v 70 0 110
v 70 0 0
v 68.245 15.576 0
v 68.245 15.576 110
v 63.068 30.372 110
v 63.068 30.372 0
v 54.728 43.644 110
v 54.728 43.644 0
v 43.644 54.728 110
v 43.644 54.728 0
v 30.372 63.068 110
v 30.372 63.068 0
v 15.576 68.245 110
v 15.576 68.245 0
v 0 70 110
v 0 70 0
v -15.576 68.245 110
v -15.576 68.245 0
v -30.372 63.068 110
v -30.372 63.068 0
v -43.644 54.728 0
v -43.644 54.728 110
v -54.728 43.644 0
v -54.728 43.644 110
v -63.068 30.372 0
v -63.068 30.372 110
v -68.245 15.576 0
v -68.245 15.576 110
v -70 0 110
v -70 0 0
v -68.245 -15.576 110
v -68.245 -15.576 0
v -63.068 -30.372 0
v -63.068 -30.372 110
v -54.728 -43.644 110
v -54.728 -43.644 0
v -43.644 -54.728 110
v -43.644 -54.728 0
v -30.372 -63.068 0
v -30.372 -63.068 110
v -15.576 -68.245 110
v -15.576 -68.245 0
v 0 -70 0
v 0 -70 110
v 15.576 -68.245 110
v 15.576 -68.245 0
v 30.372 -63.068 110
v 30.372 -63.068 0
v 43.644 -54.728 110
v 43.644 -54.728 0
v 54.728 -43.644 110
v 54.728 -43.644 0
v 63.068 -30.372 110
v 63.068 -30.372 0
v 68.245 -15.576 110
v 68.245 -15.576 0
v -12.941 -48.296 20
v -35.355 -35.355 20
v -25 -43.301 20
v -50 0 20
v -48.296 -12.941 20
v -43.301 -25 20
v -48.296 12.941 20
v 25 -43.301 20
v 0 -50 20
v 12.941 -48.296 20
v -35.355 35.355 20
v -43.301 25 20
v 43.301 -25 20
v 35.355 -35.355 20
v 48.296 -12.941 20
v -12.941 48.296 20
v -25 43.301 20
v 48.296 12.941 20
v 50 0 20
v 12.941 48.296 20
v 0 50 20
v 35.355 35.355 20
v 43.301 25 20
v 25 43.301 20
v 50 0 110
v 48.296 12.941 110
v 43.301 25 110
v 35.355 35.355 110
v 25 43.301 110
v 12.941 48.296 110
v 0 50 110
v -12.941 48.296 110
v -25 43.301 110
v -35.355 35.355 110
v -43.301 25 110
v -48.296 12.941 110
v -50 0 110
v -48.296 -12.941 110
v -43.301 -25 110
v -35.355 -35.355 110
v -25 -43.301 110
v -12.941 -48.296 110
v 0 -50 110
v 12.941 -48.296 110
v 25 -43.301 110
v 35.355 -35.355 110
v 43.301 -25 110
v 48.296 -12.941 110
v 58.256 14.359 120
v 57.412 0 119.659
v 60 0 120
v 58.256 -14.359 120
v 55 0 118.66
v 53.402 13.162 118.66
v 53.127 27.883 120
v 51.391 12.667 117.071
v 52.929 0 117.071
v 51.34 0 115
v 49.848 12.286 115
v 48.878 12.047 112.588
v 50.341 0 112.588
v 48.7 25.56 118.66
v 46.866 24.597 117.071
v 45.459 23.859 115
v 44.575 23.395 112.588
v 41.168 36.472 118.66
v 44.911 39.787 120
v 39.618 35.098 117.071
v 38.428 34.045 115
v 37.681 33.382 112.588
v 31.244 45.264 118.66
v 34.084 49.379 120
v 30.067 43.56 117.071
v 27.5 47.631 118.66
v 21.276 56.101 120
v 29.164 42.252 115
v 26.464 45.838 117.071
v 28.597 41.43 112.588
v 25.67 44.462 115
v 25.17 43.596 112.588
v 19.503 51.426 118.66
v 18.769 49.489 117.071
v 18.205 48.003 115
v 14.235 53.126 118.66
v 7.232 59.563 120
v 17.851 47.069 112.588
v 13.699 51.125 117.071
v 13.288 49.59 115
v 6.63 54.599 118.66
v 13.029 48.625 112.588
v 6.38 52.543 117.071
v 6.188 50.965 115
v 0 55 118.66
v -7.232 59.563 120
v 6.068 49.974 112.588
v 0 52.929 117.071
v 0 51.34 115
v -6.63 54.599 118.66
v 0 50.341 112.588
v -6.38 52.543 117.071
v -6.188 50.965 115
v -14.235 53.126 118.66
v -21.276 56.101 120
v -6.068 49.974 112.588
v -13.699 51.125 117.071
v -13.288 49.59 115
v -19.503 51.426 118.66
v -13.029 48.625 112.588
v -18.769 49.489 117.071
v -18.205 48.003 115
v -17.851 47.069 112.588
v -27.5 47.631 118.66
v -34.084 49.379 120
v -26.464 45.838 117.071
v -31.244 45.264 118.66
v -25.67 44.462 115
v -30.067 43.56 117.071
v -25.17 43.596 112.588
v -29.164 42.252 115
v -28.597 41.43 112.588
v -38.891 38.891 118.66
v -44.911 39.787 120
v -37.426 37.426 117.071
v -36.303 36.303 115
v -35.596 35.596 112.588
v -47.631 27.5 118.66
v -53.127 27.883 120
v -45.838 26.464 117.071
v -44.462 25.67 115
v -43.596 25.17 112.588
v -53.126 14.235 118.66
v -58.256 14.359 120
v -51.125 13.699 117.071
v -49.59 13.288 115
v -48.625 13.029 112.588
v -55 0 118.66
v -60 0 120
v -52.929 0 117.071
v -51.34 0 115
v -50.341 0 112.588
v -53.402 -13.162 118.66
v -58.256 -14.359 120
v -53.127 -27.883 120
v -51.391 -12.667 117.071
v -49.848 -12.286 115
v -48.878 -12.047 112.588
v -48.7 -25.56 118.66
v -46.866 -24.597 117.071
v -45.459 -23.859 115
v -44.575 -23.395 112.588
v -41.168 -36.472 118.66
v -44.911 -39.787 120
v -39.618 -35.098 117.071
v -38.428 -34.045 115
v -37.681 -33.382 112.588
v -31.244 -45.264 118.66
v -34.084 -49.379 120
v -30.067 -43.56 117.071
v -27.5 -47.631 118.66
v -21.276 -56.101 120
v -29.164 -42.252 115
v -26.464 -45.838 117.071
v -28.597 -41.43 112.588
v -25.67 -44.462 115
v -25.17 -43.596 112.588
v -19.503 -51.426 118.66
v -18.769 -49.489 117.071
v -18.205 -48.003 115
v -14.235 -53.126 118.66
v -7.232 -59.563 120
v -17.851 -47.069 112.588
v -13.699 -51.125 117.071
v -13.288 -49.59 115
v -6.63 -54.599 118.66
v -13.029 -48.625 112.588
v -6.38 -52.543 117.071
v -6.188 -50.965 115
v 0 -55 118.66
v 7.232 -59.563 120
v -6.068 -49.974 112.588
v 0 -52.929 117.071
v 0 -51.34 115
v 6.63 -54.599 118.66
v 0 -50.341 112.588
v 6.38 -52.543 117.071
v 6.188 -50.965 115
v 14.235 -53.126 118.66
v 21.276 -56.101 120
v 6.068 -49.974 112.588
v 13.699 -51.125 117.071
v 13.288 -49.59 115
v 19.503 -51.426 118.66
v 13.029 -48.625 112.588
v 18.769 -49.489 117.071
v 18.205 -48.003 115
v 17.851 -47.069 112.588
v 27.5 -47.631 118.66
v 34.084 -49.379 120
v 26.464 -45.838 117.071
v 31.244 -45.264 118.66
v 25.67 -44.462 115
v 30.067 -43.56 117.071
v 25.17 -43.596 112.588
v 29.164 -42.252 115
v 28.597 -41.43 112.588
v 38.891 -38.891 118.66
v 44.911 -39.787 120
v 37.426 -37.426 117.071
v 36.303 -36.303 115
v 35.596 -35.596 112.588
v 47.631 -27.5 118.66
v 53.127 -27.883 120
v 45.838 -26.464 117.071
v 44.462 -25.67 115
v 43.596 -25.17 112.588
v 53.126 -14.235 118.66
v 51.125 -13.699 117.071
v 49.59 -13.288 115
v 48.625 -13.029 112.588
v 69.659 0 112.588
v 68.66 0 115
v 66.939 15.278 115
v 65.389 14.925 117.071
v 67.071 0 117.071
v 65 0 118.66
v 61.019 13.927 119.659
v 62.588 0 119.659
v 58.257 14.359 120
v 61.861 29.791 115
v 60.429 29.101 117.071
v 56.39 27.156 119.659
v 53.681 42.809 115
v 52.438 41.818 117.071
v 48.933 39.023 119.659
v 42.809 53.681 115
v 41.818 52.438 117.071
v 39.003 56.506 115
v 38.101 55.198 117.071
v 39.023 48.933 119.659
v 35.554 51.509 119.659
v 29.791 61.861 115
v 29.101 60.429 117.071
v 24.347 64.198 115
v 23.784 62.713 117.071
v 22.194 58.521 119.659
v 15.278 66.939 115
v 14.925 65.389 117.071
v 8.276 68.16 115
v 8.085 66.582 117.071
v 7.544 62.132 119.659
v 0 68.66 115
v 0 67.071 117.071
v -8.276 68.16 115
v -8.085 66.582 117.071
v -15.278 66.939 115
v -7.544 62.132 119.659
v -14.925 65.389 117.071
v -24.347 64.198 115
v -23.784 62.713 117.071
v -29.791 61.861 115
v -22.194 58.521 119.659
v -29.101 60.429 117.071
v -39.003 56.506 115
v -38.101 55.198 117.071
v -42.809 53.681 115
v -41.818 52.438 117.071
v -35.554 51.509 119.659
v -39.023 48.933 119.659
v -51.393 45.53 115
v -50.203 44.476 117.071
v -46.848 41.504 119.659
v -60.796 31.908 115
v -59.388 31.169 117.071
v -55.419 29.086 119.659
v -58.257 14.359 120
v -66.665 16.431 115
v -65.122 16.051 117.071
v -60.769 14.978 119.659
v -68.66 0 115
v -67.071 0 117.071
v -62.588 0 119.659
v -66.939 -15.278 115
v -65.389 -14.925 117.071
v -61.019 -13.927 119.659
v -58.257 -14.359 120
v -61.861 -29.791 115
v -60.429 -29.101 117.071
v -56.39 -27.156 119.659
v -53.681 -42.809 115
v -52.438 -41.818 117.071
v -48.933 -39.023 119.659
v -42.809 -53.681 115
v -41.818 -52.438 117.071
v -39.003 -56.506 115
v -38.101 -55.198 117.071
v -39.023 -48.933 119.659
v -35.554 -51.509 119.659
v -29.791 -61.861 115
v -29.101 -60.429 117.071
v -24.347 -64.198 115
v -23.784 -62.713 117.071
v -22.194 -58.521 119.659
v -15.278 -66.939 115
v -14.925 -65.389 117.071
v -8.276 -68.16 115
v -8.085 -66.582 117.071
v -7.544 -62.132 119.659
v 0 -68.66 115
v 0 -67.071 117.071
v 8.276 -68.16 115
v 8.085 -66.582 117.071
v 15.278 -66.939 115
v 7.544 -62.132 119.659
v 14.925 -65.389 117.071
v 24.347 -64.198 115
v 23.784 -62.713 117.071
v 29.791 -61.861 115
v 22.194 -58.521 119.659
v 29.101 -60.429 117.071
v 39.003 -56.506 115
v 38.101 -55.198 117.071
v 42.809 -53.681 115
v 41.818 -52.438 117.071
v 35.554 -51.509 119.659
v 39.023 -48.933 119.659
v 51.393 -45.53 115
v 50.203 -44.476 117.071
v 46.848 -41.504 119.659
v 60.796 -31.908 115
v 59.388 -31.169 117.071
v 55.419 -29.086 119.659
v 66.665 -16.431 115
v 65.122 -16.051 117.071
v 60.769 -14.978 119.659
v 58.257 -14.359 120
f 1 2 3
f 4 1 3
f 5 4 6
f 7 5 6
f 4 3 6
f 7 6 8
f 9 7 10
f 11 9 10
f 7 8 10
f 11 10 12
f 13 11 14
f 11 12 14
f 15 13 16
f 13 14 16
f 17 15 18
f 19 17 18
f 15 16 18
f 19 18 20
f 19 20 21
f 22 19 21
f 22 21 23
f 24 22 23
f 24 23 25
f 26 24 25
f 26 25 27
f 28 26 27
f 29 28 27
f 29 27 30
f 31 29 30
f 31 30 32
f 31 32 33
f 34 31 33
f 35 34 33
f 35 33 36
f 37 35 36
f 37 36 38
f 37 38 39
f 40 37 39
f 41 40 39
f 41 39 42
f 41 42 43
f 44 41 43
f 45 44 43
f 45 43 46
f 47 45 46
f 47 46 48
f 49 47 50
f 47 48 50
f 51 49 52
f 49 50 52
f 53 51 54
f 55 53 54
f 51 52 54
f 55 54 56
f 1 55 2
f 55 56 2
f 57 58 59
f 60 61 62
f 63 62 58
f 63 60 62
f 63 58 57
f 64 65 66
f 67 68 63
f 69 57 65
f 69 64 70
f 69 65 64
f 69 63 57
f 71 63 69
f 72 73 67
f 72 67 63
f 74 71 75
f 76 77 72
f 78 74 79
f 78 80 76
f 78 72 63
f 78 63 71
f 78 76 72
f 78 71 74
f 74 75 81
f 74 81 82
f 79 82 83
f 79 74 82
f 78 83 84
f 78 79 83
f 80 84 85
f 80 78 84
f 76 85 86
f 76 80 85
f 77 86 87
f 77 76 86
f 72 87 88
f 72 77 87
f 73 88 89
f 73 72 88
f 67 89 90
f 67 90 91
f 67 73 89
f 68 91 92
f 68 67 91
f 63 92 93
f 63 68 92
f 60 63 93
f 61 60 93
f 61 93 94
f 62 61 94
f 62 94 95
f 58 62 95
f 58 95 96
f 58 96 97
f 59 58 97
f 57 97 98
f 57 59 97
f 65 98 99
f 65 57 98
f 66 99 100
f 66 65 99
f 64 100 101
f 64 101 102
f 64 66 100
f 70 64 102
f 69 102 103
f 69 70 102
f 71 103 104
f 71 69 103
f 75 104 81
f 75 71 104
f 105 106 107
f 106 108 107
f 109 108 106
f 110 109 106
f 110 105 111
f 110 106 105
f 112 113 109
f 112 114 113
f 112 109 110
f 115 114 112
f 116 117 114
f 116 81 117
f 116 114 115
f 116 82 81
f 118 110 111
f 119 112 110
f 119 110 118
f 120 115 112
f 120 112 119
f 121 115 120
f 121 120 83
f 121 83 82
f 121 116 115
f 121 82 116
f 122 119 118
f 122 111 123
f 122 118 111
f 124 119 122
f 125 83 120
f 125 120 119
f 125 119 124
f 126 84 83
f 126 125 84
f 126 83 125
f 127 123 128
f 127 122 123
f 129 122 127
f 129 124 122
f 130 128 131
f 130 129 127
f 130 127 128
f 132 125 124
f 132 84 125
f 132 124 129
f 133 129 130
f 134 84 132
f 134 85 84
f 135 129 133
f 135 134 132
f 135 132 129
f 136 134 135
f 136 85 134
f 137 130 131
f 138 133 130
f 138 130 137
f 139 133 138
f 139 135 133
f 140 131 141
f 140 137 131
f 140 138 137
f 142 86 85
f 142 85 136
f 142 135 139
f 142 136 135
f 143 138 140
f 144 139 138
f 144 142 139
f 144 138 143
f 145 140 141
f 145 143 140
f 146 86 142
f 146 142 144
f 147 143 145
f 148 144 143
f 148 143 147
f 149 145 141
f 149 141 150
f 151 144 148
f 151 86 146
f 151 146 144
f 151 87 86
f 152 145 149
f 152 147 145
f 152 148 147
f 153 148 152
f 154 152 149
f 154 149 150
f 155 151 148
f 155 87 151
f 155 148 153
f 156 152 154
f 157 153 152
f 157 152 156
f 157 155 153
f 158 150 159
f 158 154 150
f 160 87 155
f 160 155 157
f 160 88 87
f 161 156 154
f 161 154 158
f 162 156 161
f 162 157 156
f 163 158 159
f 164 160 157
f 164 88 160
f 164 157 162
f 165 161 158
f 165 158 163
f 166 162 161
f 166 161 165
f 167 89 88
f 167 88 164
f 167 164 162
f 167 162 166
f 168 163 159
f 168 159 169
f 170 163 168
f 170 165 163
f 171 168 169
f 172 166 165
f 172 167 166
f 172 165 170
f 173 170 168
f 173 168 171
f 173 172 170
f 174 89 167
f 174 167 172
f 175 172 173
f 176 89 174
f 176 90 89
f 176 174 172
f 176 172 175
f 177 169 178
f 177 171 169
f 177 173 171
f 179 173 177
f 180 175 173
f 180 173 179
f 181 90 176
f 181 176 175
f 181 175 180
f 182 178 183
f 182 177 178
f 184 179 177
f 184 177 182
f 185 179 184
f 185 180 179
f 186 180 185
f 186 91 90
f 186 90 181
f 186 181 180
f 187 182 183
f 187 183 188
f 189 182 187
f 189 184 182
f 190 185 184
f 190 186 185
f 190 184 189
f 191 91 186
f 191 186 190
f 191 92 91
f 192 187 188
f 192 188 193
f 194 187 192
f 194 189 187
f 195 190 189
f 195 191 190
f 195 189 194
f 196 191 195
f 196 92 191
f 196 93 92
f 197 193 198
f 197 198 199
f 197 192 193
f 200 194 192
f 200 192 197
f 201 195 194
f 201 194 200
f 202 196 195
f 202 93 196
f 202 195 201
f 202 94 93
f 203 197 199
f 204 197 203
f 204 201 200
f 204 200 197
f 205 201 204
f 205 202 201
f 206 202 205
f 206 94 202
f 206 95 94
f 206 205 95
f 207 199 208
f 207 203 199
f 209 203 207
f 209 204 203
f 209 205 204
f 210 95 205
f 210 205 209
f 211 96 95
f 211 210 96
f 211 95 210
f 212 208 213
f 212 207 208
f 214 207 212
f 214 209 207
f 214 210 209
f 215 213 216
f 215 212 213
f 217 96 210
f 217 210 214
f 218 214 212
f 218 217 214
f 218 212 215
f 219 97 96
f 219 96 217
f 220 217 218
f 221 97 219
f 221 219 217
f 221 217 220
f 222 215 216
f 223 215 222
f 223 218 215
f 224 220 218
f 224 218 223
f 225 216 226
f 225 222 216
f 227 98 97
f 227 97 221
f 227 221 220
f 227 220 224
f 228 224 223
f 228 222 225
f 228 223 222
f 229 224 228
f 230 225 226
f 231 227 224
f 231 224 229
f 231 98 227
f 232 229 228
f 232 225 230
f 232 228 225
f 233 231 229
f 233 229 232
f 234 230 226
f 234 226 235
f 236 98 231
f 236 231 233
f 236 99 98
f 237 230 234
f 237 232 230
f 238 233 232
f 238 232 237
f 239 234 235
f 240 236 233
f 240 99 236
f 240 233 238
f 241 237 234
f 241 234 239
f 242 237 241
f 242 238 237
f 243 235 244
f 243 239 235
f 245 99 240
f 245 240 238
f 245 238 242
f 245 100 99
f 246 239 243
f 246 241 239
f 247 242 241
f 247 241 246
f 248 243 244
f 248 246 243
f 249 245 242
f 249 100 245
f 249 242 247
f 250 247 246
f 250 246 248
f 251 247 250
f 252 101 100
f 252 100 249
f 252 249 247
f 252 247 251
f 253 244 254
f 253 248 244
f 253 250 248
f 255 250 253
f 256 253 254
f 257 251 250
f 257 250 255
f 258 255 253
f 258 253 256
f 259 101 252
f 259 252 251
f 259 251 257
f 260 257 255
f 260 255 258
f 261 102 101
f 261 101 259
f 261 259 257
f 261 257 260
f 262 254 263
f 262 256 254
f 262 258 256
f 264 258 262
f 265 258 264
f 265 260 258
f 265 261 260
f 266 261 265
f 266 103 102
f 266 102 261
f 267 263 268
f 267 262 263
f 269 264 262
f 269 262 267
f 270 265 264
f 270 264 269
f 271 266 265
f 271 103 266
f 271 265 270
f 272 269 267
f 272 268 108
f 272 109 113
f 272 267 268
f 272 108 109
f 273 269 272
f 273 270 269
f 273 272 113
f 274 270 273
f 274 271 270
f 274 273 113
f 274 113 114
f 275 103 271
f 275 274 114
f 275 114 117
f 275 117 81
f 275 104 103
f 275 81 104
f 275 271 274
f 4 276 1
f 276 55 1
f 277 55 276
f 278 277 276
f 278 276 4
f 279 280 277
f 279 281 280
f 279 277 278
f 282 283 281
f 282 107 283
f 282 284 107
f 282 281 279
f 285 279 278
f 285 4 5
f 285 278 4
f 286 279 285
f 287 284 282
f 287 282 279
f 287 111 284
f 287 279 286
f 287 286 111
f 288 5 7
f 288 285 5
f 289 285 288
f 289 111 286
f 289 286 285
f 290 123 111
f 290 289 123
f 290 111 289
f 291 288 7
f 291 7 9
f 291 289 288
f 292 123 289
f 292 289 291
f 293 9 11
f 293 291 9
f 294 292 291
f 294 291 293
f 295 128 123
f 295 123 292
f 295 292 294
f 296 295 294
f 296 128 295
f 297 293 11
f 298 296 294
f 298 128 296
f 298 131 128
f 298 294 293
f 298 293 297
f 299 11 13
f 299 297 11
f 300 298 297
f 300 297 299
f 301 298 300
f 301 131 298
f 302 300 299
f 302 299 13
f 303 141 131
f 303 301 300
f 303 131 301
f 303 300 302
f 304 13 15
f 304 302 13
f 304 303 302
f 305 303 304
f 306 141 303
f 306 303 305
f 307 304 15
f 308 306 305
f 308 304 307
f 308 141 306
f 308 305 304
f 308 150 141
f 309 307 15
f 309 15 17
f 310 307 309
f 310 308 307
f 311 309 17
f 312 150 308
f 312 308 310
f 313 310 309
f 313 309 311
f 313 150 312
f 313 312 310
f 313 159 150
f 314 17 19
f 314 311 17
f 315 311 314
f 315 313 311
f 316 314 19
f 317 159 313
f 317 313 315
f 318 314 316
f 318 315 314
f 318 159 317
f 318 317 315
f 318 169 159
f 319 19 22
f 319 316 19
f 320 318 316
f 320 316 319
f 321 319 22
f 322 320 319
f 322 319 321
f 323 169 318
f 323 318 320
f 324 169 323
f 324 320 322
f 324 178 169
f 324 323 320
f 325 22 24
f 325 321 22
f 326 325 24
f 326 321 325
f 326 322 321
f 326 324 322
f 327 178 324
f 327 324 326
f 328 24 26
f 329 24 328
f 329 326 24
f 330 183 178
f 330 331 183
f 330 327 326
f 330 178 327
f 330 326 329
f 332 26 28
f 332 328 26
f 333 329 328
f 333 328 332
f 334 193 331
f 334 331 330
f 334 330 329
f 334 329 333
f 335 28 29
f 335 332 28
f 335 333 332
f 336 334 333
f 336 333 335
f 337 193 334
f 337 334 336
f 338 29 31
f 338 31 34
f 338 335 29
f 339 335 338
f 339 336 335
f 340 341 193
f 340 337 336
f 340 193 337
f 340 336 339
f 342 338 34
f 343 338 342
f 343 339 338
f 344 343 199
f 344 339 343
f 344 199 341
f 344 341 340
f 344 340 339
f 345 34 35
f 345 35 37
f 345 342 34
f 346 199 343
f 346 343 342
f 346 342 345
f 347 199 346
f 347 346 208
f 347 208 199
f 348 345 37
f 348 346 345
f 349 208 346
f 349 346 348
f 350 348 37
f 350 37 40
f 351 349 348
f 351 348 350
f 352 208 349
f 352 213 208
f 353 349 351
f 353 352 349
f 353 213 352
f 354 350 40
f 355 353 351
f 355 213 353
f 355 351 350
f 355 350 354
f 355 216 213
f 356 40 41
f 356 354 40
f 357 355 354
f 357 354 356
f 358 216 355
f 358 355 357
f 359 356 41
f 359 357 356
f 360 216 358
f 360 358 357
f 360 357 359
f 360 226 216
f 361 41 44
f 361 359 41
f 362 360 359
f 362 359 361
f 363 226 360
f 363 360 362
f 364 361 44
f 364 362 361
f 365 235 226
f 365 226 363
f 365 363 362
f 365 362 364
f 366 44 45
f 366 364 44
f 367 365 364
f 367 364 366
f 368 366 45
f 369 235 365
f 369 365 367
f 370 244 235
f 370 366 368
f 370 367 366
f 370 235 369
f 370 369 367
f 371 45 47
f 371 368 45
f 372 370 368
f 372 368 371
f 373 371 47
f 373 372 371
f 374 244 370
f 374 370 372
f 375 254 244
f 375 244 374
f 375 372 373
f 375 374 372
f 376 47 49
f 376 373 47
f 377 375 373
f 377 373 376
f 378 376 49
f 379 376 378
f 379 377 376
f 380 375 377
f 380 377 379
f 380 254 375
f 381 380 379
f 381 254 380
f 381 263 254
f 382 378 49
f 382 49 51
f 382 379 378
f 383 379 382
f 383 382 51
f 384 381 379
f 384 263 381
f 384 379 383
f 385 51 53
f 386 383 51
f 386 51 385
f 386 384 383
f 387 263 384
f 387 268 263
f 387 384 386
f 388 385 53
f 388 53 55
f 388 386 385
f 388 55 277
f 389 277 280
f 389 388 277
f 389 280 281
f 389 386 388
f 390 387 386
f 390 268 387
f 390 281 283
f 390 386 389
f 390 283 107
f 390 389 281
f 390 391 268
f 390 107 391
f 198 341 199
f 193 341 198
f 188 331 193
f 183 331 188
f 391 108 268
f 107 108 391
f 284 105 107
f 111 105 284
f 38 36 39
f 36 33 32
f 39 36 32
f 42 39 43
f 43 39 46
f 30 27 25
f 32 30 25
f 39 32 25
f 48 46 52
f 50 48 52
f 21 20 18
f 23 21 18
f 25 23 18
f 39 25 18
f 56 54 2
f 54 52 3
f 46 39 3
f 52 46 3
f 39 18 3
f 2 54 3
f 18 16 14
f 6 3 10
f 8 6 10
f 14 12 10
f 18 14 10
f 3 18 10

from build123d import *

# Parameters (mm, degrees)
F2_R     = 70
F3_DEPTH = 20
F4_R     = 70
F4_R_2   = 50
F5_DEPTH = 100
F6_R     = 9.99999


# Not quite as in the source:
# - a fillet or chamfer is up to 0.001 mm smaller than in the source, because OpenCascade refuses the exact size


with BuildPart() as f3:
    # F2 (on Top) → F3 (new body)
    with BuildSketch(Plane.XY):
        Circle(F2_R)
    extrude(amount=F3_DEPTH)

    # F4 (on face) → F5 (join)
    with BuildSketch(Plane.XY.offset(20)):
        Circle(F4_R)
        Circle(F4_R_2, mode=Mode.SUBTRACT)
    extrude(amount=F5_DEPTH)

    # F6 (radius 10 in the source; OpenCascade refuses exactly that, so slightly less here)
    f6_edges = [f3.edges().sort_by_distance(p)[0] for p in [
        (-50, 0, 120),
        (-70, 0, 120),
    ]]
    fillet(f6_edges, radius=F6_R)


solid = f3.part
